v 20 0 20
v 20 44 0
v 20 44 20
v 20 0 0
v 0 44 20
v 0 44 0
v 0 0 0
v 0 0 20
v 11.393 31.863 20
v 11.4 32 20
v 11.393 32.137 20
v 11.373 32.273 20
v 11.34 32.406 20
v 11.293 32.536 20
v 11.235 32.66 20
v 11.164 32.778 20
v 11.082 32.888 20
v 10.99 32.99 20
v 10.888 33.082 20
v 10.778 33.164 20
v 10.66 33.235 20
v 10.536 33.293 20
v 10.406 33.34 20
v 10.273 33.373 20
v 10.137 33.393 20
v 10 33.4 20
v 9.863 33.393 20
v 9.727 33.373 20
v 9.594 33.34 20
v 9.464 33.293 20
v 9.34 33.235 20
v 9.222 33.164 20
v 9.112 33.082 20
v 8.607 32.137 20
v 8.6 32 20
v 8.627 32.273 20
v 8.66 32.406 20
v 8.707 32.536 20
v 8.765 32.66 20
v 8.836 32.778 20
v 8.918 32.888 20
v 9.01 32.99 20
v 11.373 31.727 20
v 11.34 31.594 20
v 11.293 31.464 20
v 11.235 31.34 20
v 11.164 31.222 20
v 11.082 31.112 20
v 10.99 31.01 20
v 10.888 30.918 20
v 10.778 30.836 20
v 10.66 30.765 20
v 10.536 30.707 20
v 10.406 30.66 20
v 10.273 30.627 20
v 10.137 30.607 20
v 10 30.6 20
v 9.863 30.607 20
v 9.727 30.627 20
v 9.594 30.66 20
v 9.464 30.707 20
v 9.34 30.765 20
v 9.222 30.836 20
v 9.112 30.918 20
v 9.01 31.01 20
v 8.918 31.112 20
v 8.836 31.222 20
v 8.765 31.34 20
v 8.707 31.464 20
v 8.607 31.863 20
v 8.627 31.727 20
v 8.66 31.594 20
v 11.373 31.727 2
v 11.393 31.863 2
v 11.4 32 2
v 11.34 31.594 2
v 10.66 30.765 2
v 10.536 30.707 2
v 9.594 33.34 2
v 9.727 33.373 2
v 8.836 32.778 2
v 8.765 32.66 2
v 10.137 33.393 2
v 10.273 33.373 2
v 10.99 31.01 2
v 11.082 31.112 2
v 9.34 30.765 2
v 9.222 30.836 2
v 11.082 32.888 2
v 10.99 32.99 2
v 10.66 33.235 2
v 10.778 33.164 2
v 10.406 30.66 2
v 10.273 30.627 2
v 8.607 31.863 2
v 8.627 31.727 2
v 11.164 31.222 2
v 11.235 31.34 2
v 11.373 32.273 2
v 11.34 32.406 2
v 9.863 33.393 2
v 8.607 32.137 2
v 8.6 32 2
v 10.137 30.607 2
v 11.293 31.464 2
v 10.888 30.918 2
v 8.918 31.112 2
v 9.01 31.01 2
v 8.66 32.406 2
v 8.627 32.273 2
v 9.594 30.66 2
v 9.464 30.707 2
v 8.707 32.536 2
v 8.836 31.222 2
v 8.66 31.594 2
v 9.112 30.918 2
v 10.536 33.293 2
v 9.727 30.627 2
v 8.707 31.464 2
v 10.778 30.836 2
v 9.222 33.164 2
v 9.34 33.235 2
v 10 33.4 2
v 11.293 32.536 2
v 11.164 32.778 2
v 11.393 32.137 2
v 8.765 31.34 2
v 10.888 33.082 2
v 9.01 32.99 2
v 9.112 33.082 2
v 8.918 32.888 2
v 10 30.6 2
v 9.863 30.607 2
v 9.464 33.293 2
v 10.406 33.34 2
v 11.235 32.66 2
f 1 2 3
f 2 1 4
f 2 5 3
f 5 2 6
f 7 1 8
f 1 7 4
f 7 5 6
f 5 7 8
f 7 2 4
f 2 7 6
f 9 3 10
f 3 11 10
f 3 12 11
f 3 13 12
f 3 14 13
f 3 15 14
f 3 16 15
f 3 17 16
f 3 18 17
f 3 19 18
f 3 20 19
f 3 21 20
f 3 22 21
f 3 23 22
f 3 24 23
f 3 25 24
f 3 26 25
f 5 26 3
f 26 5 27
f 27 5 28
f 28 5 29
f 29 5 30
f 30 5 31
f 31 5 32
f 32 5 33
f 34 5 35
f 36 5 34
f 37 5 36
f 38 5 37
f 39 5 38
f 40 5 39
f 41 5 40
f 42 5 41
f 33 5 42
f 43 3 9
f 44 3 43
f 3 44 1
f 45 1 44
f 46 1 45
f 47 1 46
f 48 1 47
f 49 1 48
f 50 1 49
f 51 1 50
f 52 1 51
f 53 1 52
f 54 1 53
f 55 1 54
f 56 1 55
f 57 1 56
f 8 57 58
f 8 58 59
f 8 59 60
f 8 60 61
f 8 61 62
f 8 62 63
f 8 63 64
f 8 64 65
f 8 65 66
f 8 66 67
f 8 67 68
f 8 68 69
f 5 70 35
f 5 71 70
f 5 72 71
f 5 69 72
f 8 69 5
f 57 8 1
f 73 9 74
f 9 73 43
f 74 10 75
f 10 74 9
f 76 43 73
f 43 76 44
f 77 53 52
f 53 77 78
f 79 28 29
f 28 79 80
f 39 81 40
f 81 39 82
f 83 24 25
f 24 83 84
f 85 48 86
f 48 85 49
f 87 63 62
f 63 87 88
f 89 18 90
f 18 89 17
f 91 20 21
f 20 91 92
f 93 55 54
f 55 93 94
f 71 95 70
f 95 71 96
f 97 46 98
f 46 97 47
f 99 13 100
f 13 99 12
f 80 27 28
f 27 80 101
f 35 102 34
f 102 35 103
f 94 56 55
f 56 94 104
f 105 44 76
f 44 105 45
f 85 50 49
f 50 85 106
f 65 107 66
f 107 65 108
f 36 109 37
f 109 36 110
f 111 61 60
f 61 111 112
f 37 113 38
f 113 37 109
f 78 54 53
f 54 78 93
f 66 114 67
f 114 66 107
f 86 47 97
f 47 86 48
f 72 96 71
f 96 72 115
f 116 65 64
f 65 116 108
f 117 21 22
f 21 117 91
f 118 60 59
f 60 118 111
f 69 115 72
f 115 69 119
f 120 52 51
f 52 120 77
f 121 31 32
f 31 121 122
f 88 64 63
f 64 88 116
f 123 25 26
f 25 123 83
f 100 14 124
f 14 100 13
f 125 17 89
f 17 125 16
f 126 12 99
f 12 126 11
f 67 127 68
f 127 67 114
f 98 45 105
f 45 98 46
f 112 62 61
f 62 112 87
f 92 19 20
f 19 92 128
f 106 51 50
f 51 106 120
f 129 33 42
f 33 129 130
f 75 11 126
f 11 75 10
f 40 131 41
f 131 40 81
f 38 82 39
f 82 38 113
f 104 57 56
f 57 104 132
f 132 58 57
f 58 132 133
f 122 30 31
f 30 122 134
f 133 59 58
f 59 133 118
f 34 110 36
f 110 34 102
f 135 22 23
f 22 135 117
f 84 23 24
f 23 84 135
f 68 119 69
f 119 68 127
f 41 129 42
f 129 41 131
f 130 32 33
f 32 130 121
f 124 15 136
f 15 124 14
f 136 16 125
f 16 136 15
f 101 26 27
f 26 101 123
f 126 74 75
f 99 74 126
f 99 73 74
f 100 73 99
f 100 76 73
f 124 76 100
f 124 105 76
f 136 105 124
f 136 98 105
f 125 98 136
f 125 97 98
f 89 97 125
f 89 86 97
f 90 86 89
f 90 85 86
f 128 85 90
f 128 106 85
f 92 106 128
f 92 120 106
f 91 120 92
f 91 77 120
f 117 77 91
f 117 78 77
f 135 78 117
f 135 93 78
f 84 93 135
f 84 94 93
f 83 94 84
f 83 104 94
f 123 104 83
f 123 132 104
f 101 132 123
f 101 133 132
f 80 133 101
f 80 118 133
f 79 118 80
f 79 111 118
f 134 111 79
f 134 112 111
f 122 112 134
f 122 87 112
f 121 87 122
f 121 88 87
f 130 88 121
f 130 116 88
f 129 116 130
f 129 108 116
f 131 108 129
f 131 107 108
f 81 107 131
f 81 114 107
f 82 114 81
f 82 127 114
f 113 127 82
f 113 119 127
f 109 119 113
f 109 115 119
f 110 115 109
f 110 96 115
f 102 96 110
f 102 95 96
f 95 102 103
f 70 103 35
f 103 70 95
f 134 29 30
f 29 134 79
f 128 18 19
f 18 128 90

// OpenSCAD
/* Taco de fixacao da tampa C1 — caixa V4. Todas as medidas em mm.
   STL: imprimir na orientacao inicial, com a abertura do furo para cima.
   A face de colagem e a extremidade y=altura na orientacao de impressao.
   Os oito tacos sao identicos; girar os traseiros 180 graus na montagem.
   Ver 07_IMPRESSAO_3D/LEIA.md para parametros e montagem. */

/* [Exportacao] */
modo = "impressao"; // [impressao,lote,montagem]
quantidade = 8; // [1:8]
colunas = 4; // [1:4]
intervalo = 6;

/* [Taco] */
largura = 20;
profundidade = 20;
altura_nominal = 44;
// Reduzir pela base se o ensaio a seco exigir folga para tolerancias/cola.
folga_altura = 0;
diametro_guia = 2.8;
profundidade_guia = 18;
// Eixo sempre 12 abaixo da face de colagem: z=47-12=35 na caixa.
distancia_eixo_ao_topo = 12;

/* [Hidden] */
$fn = 64;
altura = altura_nominal - folga_altura;
epsilon = 0.02;

module taco_montagem() {
    assert(largura > diametro_guia + 4);
    assert(profundidade_guia > 0 && profundidade_guia <= profundidade - 2);
    assert(diametro_guia > 0);
    assert(folga_altura >= 0 && folga_altura < altura_nominal);
    assert(distancia_eixo_ao_topo > diametro_guia/2 + 2 &&
           altura - distancia_eixo_ao_topo > diametro_guia/2 + 2);
    // Montagem: x=largura, y=profundidade, z=altura; cola em z=altura.
    // Furo cego entra por y=0; nao atravessa a face de colagem.
    difference() {
        cube([largura, profundidade, altura]);
        translate([largura/2, -epsilon, altura-distancia_eixo_ao_topo])
            rotate([-90,0,0])
                cylinder(d=diametro_guia, h=profundidade_guia+epsilon);
    }
}

module taco_impressao() {
    // Rotacao propria: furo vertical aberto para cima, sem suporte interno.
    // Envelope na mesa: 20 x 44; altura de impressao: 20.
    translate([0,0,profundidade]) rotate([-90,0,0]) taco_montagem();
}

if(modo == "impressao") taco_impressao();
else if(modo == "montagem") taco_montagem();
else if(modo == "lote") {
    assert(quantidade >= 1 && quantidade <= 8 && quantidade == floor(quantidade));
    assert(colunas >= 1 && colunas == floor(colunas));
    assert(intervalo > 0);
    for(i=[0:quantidade-1])
        translate([(i%colunas)*(largura+intervalo),
                   floor(i/colunas)*(altura+intervalo),0]) taco_impressao();
}
else assert(false,"Modo invalido");
